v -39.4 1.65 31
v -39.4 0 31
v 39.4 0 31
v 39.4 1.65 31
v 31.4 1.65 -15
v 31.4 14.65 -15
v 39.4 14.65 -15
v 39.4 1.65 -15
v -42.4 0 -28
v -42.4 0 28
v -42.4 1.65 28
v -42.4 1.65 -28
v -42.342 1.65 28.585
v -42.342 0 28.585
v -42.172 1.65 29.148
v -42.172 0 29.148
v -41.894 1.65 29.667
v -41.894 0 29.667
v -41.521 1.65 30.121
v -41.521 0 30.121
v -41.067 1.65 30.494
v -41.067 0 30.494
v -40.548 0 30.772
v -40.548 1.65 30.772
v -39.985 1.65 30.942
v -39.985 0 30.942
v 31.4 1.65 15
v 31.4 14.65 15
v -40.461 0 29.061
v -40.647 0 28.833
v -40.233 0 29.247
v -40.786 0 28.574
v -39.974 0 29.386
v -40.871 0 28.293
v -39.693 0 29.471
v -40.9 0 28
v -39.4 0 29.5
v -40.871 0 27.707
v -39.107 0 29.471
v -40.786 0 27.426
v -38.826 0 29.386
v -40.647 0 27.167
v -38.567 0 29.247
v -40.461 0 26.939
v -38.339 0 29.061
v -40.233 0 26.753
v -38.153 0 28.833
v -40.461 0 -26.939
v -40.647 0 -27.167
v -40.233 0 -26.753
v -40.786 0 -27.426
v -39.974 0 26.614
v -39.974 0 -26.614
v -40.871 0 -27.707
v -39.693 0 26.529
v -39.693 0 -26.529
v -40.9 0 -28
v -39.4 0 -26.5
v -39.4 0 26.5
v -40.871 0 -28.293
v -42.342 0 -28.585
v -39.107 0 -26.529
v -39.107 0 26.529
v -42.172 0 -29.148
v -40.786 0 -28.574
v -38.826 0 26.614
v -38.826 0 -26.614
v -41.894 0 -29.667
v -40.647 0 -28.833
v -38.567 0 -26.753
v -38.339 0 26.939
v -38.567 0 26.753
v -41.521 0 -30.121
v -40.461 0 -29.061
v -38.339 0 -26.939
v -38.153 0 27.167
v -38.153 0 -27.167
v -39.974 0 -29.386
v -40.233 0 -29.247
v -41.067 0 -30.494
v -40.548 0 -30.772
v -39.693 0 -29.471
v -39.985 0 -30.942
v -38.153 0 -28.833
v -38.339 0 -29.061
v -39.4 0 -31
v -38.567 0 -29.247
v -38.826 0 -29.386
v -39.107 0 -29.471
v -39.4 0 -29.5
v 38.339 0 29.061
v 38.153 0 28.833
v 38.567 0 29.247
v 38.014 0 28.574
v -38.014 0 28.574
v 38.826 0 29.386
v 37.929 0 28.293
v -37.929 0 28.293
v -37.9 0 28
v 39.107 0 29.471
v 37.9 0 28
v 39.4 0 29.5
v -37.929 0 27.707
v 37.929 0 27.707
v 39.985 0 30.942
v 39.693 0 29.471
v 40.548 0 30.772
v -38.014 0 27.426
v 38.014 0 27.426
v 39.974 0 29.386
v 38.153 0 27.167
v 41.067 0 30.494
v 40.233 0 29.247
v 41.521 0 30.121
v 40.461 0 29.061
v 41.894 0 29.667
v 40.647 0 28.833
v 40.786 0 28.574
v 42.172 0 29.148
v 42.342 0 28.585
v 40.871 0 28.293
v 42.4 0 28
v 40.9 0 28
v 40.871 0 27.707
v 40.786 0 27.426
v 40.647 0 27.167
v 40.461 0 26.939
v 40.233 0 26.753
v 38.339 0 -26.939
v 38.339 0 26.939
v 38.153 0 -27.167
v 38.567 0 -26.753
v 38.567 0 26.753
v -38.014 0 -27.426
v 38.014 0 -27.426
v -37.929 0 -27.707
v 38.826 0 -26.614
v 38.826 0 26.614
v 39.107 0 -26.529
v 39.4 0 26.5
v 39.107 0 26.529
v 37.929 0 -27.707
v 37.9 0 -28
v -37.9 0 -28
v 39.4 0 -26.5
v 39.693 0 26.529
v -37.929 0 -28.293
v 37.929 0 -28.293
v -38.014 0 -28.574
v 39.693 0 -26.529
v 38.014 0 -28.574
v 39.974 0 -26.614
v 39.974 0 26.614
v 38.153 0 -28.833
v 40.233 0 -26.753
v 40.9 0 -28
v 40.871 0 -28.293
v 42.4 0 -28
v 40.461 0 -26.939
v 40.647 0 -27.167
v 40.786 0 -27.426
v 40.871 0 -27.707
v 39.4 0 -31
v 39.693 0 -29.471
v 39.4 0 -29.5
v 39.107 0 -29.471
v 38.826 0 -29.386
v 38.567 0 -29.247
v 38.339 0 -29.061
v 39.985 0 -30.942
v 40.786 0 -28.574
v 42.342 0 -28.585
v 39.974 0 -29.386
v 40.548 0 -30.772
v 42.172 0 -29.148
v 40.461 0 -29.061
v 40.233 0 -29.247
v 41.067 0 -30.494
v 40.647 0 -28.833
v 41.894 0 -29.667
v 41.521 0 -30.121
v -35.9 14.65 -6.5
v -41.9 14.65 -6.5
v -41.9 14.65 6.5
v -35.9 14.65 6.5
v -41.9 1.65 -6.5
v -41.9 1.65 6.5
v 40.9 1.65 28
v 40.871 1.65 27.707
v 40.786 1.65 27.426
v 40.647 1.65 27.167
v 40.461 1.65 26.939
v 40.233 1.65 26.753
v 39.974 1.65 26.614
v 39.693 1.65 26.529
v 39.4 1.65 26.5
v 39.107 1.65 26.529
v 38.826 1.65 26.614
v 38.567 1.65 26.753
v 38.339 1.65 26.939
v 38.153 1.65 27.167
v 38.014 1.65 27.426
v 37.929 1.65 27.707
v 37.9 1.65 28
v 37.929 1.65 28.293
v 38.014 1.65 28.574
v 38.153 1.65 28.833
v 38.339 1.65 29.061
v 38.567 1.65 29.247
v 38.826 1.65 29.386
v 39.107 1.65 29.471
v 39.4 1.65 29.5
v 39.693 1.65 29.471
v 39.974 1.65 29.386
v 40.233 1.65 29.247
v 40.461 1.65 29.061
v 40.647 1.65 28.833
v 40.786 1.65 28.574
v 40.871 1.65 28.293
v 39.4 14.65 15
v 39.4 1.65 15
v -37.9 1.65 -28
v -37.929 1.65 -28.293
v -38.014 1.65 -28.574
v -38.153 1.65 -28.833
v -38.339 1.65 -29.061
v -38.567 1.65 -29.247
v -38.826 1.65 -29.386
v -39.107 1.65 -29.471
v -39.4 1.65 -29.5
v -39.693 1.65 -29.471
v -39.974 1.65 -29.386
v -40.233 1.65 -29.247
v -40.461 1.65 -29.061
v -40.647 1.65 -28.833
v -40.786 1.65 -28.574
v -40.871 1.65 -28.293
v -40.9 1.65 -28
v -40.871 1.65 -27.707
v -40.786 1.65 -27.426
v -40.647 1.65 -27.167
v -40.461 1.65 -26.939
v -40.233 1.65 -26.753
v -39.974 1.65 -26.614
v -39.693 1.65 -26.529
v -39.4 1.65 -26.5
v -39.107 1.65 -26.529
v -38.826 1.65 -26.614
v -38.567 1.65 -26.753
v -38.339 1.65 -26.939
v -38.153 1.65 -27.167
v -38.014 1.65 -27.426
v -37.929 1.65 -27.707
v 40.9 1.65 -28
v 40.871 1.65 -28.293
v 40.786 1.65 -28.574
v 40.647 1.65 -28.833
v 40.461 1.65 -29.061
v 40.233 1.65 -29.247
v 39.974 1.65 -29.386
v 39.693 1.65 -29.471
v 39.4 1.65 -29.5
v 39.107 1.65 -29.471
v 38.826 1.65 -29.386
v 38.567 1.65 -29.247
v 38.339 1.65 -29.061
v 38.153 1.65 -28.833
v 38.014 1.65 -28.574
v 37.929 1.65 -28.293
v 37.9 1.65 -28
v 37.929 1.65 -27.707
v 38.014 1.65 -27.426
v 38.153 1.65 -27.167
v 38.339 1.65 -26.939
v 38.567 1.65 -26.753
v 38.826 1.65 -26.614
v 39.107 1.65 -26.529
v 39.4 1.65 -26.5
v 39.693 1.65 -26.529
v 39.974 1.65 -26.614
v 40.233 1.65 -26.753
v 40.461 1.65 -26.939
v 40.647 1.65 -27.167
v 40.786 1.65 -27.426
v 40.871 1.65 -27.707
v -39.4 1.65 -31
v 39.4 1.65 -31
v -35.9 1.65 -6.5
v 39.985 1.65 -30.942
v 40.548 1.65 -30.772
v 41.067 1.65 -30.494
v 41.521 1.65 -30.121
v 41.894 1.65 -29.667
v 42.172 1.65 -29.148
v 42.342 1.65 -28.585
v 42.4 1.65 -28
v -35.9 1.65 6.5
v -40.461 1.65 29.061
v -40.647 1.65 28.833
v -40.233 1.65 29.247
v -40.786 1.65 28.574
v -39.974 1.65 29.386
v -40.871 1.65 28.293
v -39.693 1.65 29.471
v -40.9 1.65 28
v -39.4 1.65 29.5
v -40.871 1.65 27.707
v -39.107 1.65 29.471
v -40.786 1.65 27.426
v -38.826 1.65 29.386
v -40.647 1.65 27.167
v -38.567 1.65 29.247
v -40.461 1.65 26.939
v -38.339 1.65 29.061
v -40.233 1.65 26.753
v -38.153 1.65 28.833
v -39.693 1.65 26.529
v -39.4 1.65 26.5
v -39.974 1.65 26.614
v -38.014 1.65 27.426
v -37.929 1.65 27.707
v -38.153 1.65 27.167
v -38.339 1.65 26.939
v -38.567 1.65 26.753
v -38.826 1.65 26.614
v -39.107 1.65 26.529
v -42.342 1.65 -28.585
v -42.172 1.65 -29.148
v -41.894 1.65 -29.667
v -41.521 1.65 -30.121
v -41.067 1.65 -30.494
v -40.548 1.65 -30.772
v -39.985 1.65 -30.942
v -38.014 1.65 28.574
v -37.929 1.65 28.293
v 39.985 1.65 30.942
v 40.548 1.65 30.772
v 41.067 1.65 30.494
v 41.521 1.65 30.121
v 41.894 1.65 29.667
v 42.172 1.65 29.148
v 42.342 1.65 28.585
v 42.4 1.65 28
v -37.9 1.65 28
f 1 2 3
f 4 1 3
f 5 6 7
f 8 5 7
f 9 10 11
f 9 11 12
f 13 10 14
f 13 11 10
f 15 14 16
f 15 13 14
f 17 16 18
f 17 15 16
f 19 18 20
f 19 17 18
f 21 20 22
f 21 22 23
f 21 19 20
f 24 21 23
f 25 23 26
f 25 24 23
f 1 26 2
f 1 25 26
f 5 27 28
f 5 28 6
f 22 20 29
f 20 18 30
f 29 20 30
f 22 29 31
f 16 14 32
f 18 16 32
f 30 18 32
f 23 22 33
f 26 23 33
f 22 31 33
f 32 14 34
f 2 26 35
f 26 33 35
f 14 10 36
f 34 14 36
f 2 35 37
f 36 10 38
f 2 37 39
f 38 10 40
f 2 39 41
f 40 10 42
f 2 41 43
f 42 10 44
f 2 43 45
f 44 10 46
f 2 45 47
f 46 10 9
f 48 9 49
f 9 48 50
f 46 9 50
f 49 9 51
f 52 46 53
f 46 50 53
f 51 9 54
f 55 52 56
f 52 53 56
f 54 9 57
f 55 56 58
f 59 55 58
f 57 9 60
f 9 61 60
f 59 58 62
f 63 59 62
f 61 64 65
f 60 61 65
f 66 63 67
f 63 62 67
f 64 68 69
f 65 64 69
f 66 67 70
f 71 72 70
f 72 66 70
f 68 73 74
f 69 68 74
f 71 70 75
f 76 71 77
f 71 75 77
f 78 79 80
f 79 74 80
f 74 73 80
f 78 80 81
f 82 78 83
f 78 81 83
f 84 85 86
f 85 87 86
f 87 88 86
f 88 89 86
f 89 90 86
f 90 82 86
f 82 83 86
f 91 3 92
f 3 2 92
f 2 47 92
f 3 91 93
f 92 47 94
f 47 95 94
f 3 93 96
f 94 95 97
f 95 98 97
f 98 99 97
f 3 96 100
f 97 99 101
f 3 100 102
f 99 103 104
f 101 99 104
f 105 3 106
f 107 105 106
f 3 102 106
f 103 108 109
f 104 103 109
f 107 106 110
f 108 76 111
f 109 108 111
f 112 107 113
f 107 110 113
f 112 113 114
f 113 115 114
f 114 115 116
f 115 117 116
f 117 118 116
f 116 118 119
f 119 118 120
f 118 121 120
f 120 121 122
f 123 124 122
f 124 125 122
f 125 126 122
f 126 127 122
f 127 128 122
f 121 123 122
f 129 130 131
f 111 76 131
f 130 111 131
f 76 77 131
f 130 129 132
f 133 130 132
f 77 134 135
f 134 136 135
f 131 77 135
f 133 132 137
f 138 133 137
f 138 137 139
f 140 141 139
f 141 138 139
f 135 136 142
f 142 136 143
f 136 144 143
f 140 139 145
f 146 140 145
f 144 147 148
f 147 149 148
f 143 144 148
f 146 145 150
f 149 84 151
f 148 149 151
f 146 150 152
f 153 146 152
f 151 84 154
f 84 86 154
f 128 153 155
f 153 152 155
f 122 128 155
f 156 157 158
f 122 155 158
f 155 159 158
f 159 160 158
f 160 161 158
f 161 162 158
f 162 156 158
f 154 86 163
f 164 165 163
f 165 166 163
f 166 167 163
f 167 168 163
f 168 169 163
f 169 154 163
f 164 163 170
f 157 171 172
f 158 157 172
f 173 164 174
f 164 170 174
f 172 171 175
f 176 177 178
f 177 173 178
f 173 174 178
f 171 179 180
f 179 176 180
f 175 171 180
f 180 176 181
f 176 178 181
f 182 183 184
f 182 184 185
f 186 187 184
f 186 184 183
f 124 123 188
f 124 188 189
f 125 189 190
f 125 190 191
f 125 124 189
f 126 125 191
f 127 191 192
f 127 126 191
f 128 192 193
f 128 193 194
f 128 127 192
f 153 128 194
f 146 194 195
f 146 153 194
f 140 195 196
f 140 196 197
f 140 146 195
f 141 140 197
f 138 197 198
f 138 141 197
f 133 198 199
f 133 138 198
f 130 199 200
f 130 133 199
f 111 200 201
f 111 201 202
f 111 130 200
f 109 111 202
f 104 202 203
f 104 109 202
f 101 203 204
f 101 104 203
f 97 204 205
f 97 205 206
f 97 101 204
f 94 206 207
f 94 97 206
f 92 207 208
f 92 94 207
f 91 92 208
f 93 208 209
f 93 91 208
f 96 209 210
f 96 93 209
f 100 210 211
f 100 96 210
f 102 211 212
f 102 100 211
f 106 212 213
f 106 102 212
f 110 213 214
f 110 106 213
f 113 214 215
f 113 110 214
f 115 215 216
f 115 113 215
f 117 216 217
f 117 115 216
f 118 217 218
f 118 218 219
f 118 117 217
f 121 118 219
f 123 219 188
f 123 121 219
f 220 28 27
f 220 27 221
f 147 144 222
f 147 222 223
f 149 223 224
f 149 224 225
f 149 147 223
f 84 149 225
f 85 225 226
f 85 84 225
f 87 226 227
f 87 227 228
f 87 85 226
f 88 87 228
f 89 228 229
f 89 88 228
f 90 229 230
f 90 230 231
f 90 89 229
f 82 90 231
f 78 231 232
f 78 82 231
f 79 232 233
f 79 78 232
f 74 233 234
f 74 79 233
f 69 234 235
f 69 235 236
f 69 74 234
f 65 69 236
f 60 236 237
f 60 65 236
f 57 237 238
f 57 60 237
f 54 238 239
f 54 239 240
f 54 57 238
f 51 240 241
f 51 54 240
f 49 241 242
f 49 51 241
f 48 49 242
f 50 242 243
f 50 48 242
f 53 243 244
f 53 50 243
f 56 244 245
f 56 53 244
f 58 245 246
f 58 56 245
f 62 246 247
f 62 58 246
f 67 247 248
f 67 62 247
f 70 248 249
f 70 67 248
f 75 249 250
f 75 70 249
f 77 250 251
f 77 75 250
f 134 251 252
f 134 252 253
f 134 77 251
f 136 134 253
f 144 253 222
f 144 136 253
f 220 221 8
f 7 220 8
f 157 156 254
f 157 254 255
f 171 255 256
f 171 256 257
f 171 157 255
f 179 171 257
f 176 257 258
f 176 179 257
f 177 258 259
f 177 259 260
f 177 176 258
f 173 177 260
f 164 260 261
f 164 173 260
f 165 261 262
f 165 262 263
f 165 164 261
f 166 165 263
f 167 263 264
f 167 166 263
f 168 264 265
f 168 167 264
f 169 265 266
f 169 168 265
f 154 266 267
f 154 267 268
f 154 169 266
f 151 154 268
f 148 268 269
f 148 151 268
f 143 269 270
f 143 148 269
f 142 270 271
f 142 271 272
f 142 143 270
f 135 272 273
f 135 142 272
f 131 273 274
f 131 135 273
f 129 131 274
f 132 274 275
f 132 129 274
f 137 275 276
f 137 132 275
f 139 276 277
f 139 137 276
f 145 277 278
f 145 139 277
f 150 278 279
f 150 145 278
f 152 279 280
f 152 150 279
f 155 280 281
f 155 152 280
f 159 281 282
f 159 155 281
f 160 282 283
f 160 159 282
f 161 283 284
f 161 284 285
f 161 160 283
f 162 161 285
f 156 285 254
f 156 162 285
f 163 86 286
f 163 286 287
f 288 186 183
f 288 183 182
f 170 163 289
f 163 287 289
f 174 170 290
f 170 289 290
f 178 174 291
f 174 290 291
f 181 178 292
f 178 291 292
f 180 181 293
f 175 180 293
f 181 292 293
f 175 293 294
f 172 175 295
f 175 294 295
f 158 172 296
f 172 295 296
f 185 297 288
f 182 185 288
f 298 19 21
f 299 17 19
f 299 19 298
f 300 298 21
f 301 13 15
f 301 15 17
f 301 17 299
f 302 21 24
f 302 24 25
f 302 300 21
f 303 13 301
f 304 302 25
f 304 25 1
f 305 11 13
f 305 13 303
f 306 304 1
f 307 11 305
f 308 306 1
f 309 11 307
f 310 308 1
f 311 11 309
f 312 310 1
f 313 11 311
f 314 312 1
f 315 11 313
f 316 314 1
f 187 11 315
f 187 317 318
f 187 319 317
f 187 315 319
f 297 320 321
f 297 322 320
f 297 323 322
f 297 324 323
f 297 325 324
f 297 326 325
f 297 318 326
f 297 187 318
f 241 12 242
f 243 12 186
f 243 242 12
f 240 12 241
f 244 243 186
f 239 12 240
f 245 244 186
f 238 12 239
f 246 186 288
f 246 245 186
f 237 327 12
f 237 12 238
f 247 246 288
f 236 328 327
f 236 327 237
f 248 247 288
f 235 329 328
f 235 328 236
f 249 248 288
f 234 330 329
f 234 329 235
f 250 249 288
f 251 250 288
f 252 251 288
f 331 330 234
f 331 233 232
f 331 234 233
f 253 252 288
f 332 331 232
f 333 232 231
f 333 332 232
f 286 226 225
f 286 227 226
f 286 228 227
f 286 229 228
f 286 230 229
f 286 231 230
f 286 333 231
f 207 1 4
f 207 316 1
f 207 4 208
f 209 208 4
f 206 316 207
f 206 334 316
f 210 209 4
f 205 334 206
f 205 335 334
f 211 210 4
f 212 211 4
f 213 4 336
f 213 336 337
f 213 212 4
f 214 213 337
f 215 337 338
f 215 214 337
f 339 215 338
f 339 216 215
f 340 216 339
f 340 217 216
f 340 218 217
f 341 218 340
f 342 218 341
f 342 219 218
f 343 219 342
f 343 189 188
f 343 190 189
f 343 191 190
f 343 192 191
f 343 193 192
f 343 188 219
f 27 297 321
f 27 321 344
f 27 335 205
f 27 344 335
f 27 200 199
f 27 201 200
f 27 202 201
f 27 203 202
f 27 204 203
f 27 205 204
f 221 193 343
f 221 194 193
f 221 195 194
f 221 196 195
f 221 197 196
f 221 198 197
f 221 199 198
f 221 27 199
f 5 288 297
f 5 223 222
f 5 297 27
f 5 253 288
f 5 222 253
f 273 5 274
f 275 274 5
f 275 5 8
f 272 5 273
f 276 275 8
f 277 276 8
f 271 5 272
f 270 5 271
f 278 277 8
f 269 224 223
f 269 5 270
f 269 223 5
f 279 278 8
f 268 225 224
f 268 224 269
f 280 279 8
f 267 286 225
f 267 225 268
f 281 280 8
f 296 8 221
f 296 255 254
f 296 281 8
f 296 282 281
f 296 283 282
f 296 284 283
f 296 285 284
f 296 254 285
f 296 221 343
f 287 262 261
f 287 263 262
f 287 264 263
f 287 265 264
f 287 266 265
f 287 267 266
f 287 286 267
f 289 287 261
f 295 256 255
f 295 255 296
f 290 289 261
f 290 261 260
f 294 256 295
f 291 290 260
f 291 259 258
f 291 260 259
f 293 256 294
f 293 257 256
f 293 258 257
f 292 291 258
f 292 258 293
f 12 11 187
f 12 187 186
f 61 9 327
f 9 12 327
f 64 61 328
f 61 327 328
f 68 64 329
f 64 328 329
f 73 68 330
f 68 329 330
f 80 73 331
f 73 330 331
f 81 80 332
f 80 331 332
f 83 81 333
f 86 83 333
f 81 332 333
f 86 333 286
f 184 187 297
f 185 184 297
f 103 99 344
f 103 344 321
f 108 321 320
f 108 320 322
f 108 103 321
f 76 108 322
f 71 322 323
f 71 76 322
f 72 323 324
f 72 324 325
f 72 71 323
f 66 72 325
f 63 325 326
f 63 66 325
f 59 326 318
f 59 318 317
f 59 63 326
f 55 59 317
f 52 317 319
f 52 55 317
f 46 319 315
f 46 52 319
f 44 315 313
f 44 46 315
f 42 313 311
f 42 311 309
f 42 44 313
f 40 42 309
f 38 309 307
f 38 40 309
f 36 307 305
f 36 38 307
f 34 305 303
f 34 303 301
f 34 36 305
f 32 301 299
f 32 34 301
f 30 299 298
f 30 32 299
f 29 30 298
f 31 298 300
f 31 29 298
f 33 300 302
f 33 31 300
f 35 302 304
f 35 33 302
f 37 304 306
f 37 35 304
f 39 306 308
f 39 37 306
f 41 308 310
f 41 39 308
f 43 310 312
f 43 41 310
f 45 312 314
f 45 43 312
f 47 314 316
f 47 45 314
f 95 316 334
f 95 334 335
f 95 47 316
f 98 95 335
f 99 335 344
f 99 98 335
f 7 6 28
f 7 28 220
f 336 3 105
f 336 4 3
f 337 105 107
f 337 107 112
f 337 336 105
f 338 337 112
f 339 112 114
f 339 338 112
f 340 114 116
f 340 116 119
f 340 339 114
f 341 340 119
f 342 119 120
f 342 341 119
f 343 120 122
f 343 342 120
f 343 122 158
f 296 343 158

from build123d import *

# Parameters (mm, degrees)
SKETCH1_W           = 84.8
SKETCH1_H           = 62
SKETCH1_R           = 1.5
BOSS_EXTRUDE1_DEPTH = 1.65
FILLET1_R           = 3
SKETCH2_W           = 6
SKETCH2_H           = 13
SKETCH2_W_2         = 8
SKETCH2_H_2         = 30
BOSS_EXTRUDE2_DEPTH = 13


with BuildPart() as part:
    # Sketch1 → Boss-Extrude1 (new body)
    with BuildSketch(Plane(origin=(0, 0, 0), x_dir=(1, 0, 0), z_dir=(0, 1, 0))):
        Rectangle(SKETCH1_W, SKETCH1_H)
        with Locations((-39.4, 28)):
            Circle(SKETCH1_R, mode=Mode.SUBTRACT)
        with Locations((39.4, 28)):
            Circle(SKETCH1_R, mode=Mode.SUBTRACT)
        with Locations((39.4, -28)):
            Circle(SKETCH1_R, mode=Mode.SUBTRACT)
        with Locations((-39.4, -28)):
            Circle(SKETCH1_R, mode=Mode.SUBTRACT)
    extrude(amount=BOSS_EXTRUDE1_DEPTH)

    # Fillet1
    fillet1_edges = [part.edges().sort_by_distance(p)[0] for p in [
        (-42.4, 0.825, -31),
        (42.4, 0.825, -31),
        (42.4, 0.825, 31),
        (-42.4, 0.825, 31),
    ]]
    fillet(fillet1_edges, radius=FILLET1_R)

    # Sketch2 → Boss-Extrude2 (add)
    with BuildSketch(Plane(origin=(0, 1.65, 0), x_dir=(1, 0, 0), z_dir=(0, 1, 0))):
        with Locations((-38.9, 0)):
            Rectangle(SKETCH2_W, SKETCH2_H)
        with Locations((35.4, 0)):
            Rectangle(SKETCH2_W_2, SKETCH2_H_2)
    extrude(amount=BOSS_EXTRUDE2_DEPTH)


solid = part.part
